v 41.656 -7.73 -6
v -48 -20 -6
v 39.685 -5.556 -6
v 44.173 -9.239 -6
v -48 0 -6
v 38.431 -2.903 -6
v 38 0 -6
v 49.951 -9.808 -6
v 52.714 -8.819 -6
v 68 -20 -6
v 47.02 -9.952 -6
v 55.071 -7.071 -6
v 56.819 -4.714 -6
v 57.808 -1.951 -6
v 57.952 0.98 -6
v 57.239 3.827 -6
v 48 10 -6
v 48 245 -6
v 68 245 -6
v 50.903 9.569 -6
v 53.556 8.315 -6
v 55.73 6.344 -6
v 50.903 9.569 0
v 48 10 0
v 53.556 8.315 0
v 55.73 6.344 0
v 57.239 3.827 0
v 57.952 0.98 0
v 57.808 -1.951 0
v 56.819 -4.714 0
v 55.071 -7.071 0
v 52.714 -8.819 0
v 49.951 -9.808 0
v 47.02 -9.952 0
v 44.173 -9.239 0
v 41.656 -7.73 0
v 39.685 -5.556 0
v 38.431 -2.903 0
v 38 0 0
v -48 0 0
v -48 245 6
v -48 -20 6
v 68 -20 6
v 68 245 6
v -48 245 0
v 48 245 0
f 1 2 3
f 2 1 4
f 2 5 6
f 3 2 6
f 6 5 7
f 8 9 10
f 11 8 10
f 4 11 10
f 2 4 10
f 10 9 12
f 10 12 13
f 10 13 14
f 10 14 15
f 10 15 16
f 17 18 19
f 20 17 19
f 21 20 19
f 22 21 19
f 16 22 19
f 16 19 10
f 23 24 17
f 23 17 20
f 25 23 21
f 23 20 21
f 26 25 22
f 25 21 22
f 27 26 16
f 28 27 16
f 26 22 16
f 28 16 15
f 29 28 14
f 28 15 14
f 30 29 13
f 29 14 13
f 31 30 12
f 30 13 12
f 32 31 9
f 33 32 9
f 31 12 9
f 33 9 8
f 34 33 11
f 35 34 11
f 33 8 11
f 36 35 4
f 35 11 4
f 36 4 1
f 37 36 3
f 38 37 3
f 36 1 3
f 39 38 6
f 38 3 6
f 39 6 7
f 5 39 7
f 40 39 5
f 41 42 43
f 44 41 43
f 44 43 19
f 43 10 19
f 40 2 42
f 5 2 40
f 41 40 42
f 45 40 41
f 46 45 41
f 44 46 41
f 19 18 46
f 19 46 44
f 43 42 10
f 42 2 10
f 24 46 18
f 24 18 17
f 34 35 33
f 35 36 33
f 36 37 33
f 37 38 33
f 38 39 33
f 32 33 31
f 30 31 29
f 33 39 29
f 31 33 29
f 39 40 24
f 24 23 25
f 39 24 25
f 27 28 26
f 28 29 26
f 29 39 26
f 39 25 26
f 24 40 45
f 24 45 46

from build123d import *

# Parameters (mm, degrees)
BOSS_EXTRUDE1_DEPTH = 6
SKETCH2_W           = 116
SKETCH2_H           = 265
BOSS_EXTRUDE2_DEPTH = 6
SKETCH3_R           = 10
CUT_EXTRUDE1_DEPTH  = 6


with BuildPart() as part:
    # Sketch1 → Boss-Extrude1 (new body)
    with BuildSketch(Plane.XY):
        Polygon((68, 245), (48, 245), (48, 0), (-48, 0), (-48, -20), (68, -20), align=None)
    extrude(amount=-BOSS_EXTRUDE1_DEPTH)

    # Sketch2 → Boss-Extrude2 (add)
    with BuildSketch(Plane.XY):
        with Locations((10, 112.5)):
            Rectangle(SKETCH2_W, SKETCH2_H)
    extrude(amount=BOSS_EXTRUDE2_DEPTH)

    # Sketch3 → Cut-Extrude1 (cut)
    with BuildSketch(Plane(origin=(0, 0, -6), x_dir=(-1, 0, 0), z_dir=(0, 0, -1))):
        with Locations((-48, 0)):
            Circle(SKETCH3_R)
    extrude(amount=-CUT_EXTRUDE1_DEPTH, mode=Mode.SUBTRACT)


solid = part.part
